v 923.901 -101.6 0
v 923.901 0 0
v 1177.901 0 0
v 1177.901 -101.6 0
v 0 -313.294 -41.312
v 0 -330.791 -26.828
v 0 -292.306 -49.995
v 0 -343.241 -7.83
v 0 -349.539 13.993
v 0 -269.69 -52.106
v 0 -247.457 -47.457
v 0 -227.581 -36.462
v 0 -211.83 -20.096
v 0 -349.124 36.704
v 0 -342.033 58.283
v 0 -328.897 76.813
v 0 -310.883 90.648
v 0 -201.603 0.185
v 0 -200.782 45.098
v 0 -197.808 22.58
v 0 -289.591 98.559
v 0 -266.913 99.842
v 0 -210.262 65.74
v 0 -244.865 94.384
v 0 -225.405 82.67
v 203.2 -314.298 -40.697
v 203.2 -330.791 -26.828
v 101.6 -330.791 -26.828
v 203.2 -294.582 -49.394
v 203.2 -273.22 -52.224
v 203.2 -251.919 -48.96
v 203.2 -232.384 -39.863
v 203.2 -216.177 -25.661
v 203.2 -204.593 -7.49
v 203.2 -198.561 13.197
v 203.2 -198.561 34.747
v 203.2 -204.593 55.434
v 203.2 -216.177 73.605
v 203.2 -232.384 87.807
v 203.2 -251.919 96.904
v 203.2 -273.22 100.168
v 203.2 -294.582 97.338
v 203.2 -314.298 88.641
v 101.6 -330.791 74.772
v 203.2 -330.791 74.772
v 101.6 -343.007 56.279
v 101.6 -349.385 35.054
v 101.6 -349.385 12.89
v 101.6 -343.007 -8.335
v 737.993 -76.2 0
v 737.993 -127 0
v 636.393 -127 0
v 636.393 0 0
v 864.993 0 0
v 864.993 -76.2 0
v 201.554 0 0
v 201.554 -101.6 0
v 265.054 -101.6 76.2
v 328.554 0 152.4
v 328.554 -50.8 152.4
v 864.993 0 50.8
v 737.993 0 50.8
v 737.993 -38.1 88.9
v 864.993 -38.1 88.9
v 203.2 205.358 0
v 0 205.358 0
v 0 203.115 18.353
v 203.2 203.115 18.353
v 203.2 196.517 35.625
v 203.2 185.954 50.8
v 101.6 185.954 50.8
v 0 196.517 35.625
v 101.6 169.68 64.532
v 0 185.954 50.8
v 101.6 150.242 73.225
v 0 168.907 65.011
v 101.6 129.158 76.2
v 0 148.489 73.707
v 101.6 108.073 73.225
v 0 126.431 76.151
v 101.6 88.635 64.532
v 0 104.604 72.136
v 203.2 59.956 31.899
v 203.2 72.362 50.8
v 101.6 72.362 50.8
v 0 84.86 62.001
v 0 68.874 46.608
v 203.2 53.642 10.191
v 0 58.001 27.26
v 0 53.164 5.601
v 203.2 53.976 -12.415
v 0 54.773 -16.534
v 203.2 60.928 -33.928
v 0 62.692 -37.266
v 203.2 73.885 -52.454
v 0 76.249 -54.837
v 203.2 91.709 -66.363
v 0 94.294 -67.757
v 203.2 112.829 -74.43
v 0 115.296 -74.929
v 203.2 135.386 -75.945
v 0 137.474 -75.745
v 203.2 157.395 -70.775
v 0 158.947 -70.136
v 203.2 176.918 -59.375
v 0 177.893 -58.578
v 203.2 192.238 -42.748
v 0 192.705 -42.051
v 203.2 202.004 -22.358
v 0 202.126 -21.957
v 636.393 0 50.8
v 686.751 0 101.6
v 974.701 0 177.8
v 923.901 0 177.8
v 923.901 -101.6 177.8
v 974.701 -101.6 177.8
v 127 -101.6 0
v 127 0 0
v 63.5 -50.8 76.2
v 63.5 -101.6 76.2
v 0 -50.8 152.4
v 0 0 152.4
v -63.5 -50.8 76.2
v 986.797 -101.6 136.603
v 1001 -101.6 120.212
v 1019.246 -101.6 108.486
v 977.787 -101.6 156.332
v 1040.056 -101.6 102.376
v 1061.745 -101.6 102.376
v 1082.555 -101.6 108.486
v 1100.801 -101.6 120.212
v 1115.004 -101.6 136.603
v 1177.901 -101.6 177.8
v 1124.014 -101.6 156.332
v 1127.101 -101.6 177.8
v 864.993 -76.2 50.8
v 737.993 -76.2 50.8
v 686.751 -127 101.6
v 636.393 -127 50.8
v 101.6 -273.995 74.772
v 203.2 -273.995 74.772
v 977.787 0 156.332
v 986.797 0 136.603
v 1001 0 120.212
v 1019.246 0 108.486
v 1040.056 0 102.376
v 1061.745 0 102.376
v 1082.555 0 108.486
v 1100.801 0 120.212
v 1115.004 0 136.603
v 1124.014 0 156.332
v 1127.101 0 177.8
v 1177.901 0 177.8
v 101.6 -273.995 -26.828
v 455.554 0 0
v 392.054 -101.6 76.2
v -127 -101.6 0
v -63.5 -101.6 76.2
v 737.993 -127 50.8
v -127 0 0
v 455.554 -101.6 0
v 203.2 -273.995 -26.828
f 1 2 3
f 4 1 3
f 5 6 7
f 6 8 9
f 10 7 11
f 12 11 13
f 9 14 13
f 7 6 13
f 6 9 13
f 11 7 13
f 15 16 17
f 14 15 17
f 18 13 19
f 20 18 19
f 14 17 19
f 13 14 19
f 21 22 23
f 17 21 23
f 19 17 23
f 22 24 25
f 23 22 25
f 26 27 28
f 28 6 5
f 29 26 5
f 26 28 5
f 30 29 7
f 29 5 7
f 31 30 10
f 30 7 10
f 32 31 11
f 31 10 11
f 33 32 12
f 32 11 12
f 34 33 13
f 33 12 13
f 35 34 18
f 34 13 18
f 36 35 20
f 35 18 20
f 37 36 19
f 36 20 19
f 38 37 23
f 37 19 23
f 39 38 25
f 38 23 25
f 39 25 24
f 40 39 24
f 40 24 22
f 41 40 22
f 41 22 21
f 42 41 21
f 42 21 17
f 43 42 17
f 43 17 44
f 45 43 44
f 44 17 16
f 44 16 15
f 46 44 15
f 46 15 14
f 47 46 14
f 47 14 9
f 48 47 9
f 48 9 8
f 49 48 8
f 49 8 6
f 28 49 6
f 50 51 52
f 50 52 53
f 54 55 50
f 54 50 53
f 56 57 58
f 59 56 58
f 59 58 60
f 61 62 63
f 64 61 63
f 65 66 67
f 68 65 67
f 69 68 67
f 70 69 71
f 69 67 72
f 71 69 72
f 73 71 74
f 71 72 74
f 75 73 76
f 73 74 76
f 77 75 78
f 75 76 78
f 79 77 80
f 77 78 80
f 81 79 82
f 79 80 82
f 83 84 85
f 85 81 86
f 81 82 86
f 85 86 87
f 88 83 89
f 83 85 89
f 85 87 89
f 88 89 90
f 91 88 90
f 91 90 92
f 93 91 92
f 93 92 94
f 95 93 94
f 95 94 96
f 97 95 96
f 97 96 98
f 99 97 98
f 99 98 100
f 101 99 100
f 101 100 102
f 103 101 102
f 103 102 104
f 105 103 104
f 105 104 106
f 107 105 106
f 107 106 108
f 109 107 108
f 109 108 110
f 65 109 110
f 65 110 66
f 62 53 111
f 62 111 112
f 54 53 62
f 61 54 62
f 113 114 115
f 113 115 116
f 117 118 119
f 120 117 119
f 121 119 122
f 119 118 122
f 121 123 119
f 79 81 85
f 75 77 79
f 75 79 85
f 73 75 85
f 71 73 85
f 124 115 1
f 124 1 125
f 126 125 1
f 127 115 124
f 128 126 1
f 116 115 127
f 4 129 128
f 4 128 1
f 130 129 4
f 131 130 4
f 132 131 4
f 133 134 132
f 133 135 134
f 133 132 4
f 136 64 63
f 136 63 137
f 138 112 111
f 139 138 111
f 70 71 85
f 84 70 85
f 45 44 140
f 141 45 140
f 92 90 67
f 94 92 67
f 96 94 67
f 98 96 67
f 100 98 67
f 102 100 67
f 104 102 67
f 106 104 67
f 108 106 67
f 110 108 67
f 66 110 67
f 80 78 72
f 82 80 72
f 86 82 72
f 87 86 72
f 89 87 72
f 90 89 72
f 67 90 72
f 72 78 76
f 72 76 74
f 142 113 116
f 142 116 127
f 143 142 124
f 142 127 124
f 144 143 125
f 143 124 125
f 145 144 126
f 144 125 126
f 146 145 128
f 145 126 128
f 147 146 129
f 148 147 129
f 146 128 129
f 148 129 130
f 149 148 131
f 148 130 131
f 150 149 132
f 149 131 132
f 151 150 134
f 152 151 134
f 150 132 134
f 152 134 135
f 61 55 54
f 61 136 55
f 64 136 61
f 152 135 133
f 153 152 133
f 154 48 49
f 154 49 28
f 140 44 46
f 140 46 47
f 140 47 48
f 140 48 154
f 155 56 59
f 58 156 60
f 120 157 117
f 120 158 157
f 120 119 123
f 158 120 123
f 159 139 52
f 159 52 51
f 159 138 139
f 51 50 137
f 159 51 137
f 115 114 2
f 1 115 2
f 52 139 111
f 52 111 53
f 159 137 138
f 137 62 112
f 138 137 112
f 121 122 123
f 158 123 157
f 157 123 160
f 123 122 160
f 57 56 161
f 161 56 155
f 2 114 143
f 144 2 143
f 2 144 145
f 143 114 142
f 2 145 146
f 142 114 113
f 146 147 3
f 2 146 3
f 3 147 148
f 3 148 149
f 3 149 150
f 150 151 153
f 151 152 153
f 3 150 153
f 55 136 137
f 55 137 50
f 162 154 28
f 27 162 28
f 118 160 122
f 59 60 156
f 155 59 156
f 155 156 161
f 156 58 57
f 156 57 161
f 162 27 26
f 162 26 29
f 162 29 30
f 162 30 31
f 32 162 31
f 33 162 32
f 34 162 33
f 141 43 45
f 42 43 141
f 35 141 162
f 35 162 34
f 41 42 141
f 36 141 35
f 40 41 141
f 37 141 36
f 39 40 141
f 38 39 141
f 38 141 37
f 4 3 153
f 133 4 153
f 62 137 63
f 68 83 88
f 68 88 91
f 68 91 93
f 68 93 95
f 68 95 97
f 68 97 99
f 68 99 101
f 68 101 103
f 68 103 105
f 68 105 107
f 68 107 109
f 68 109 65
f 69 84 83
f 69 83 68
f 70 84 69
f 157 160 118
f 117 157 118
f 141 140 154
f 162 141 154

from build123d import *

# Parameters (mm, degrees)
F1_DEPTH  = 101.6
F2_DEPTH  = 50.8
F3_W      = 254
F3_H      = 152.4
F4_DEPTH  = 101.6
F7_DEPTH  = 254
F8_DEPTH  = 101.6
F9_DEPTH  = 101.6
F11_DEPTH = 127
F14_DEPTH = 127
F16_DEPTH = 203.2
F17_DEPTH = 101.6
F19_DEPTH = 203.2
F20_DEPTH = 101.6
F21_W     = 254
F21_H     = 88.9
F22_DEPTH = 101.6
F24_DEPTH = 101.6


with BuildPart() as f1:
    # F0 (on Front) → F1 (new body)
    with BuildSketch(Plane.XZ):
        Polygon((-127, 0), (0, 0), (0, 76.2), (-63.5, 76.2), align=None)
        Polygon((0, 76.2), (0, 0), (127, 0), (63.5, 76.2), align=None)
    extrude(amount=F1_DEPTH)

    # F0 (on Front) → F2 (join)
    with BuildSketch(Plane.XZ):
        Polygon((0, 76.2), (0, 0), (127, 0), (63.5, 76.2), align=None)
        Polygon((-127, 0), (0, 0), (0, 76.2), (-63.5, 76.2), align=None)
        Polygon((-63.5, 76.2), (0, 76.2), (0, 152.4), align=None)
        Polygon((0, 152.4), (0, 76.2), (63.5, 76.2), align=None)
    extrude(amount=F2_DEPTH)


with BuildPart() as f4:
    # F3 (on Front) → F4 (new body)
    with BuildSketch(Plane.XZ):
        with Locations((328.5537848152, 76.2)):
            Rectangle(F3_W, F3_H)
    extrude(amount=F4_DEPTH)

    # F5 (on face) → F7 (cut)
    with BuildSketch(Plane.YZ.offset(455.5537848152)):
        Polygon((-101.6, 76.2), (-50.8, 152.4), (-101.6, 152.4), align=None)
    extrude(amount=-F7_DEPTH, mode=Mode.SUBTRACT)

    # F6 (on face) → F8 (cut)
    with BuildSketch(Plane.XZ.offset(101.6)):
        Polygon((201.5537848152, 0), (328.5537848152, 152.4), (201.5537848152, 152.4), align=None)
    extrude(amount=-F8_DEPTH, mode=Mode.SUBTRACT)

    # F6 (on face) → F9 (cut)
    with BuildSketch(Plane.XZ.offset(101.6)):
        Polygon((455.5537848152, 152.4), (328.5537848152, 152.4), (455.5537848152, 0), align=None)
    extrude(amount=-F9_DEPTH, mode=Mode.SUBTRACT)


with BuildPart() as f11:
    # F10 (on Front) → F11 (new body)
    with BuildSketch(Plane.XZ):
        Polygon((636.3934290931, 50.8), (636.3934290931, 0), (737.9934290931, 0), (737.9934290931, 50.8), (686.7509557304, 101.6), align=None)
    extrude(amount=F11_DEPTH)

    # F13 (on offset) → F14 (join)
    with BuildSketch(Plane.YZ.offset(864.9934290931)):
        Polygon((-76.2, 0), (0, 0), (0, 50.8), (-38.1, 88.9), (-76.2, 50.8), align=None)
    extrude(amount=-F14_DEPTH)


with BuildPart() as f16:
    # F15 (on Right) → F16 (new body)
    with BuildSketch(Plane.YZ):
        with BuildLine():
            ThreePointArc((72.3616482845, 50.8), (101.9679316723, -71.183933753), (205.357774913, 0))
            ThreePointArc((205.357774913, 0), (200.3417086659, 27.1898432407), (185.9539015415, 50.8))
            Line((185.9539015415, 50.8), (129.157774913, 50.8))
            Line((129.157774913, 50.8), (72.3616482845, 50.8))
        make_face()
    extrude(amount=F16_DEPTH)

    # F15 (on Right) → F17 (join)
    with BuildSketch(Plane.YZ):
        with BuildLine():
            ThreePointArc((72.3616482845, 50.8), (101.9679316723, -71.183933753), (205.357774913, 0))
            ThreePointArc((205.357774913, 0), (200.3417086659, 27.1898432407), (185.9539015415, 50.8))
            Line((185.9539015415, 50.8), (129.157774913, 50.8))
            Line((129.157774913, 50.8), (72.3616482845, 50.8))
        make_face()
        with BuildLine():
            Line((129.157774913, 50.8), (185.9539015415, 50.8))
            ThreePointArc((185.9539015415, 50.8), (129.157774913, 76.2), (72.3616482845, 50.8))
            Line((72.3616482845, 50.8), (129.157774913, 50.8))
        make_face()
    extrude(amount=F17_DEPTH)


with BuildPart() as f19:
    # F18 (on Right) → F19 (new body)
    with BuildSketch(Plane.YZ):
        with BuildLine():
            ThreePointArc((-330.7911684757, -26.8279835582), (-246.8051986065, -47.2119173111), (-197.7950418472, 23.9720164418))
            ThreePointArc((-197.7950418472, 23.9720164418), (-246.8051986065, 95.1559501948), (-330.7911684757, 74.7720164418))
            Line((-330.7911684757, 74.7720164418), (-273.9950418472, 74.7720164418))
            Line((-273.9950418472, 74.7720164418), (-273.9950418472, 23.9720164418))
            Line((-273.9950418472, 23.9720164418), (-273.9950418472, -26.8279835582))
            Line((-273.9950418472, -26.8279835582), (-330.7911684757, -26.8279835582))
        make_face()
    extrude(amount=F19_DEPTH)

    # F18 (on Right) → F20 (join)
    with BuildSketch(Plane.YZ):
        with BuildLine():
            ThreePointArc((-330.7911684757, -26.8279835582), (-246.8051986065, -47.2119173111), (-197.7950418472, 23.9720164418))
            ThreePointArc((-197.7950418472, 23.9720164418), (-246.8051986065, 95.1559501948), (-330.7911684757, 74.7720164418))
            Line((-330.7911684757, 74.7720164418), (-273.9950418472, 74.7720164418))
            Line((-273.9950418472, 74.7720164418), (-273.9950418472, 23.9720164418))
            Line((-273.9950418472, 23.9720164418), (-273.9950418472, -26.8279835582))
            Line((-273.9950418472, -26.8279835582), (-330.7911684757, -26.8279835582))
        make_face()
        with BuildLine():
            Line((-273.9950418472, 74.7720164418), (-330.7911684757, 74.7720164418))
            ThreePointArc((-330.7911684757, 74.7720164418), (-350.1950418472, 23.9720164418), (-330.7911684757, -26.8279835582))
            Line((-330.7911684757, -26.8279835582), (-273.9950418472, -26.8279835582))
            Line((-273.9950418472, -26.8279835582), (-273.9950418472, 23.9720164418))
            Line((-273.9950418472, 23.9720164418), (-273.9950418472, 74.7720164418))
        make_face()
    extrude(amount=F20_DEPTH)


with BuildPart() as f22:
    # F21 (on Front) → F22 (new body)
    with BuildSketch(Plane.XZ):
        with Locations((1050.9006237632, 44.45)):
            Rectangle(F21_W, F21_H)
        with Locations((1050.9006237632, 133.35)):
            Rectangle(F21_W, F21_H)
    extrude(amount=F22_DEPTH)

    # F23 (on face) → F24 (cut)
    with BuildSketch(Plane.XZ.offset(101.6)):
        with BuildLine():
            ThreePointArc((974.7006237632, 177.8), (1050.9006237632, 101.6), (1127.1006237632, 177.8))
            Line((1127.1006237632, 177.8), (974.7006237632, 177.8))
        make_face()
    extrude(amount=-F24_DEPTH, mode=Mode.SUBTRACT)


solid = Compound([f1.part, f4.part, f11.part, f16.part, f19.part, f22.part])
